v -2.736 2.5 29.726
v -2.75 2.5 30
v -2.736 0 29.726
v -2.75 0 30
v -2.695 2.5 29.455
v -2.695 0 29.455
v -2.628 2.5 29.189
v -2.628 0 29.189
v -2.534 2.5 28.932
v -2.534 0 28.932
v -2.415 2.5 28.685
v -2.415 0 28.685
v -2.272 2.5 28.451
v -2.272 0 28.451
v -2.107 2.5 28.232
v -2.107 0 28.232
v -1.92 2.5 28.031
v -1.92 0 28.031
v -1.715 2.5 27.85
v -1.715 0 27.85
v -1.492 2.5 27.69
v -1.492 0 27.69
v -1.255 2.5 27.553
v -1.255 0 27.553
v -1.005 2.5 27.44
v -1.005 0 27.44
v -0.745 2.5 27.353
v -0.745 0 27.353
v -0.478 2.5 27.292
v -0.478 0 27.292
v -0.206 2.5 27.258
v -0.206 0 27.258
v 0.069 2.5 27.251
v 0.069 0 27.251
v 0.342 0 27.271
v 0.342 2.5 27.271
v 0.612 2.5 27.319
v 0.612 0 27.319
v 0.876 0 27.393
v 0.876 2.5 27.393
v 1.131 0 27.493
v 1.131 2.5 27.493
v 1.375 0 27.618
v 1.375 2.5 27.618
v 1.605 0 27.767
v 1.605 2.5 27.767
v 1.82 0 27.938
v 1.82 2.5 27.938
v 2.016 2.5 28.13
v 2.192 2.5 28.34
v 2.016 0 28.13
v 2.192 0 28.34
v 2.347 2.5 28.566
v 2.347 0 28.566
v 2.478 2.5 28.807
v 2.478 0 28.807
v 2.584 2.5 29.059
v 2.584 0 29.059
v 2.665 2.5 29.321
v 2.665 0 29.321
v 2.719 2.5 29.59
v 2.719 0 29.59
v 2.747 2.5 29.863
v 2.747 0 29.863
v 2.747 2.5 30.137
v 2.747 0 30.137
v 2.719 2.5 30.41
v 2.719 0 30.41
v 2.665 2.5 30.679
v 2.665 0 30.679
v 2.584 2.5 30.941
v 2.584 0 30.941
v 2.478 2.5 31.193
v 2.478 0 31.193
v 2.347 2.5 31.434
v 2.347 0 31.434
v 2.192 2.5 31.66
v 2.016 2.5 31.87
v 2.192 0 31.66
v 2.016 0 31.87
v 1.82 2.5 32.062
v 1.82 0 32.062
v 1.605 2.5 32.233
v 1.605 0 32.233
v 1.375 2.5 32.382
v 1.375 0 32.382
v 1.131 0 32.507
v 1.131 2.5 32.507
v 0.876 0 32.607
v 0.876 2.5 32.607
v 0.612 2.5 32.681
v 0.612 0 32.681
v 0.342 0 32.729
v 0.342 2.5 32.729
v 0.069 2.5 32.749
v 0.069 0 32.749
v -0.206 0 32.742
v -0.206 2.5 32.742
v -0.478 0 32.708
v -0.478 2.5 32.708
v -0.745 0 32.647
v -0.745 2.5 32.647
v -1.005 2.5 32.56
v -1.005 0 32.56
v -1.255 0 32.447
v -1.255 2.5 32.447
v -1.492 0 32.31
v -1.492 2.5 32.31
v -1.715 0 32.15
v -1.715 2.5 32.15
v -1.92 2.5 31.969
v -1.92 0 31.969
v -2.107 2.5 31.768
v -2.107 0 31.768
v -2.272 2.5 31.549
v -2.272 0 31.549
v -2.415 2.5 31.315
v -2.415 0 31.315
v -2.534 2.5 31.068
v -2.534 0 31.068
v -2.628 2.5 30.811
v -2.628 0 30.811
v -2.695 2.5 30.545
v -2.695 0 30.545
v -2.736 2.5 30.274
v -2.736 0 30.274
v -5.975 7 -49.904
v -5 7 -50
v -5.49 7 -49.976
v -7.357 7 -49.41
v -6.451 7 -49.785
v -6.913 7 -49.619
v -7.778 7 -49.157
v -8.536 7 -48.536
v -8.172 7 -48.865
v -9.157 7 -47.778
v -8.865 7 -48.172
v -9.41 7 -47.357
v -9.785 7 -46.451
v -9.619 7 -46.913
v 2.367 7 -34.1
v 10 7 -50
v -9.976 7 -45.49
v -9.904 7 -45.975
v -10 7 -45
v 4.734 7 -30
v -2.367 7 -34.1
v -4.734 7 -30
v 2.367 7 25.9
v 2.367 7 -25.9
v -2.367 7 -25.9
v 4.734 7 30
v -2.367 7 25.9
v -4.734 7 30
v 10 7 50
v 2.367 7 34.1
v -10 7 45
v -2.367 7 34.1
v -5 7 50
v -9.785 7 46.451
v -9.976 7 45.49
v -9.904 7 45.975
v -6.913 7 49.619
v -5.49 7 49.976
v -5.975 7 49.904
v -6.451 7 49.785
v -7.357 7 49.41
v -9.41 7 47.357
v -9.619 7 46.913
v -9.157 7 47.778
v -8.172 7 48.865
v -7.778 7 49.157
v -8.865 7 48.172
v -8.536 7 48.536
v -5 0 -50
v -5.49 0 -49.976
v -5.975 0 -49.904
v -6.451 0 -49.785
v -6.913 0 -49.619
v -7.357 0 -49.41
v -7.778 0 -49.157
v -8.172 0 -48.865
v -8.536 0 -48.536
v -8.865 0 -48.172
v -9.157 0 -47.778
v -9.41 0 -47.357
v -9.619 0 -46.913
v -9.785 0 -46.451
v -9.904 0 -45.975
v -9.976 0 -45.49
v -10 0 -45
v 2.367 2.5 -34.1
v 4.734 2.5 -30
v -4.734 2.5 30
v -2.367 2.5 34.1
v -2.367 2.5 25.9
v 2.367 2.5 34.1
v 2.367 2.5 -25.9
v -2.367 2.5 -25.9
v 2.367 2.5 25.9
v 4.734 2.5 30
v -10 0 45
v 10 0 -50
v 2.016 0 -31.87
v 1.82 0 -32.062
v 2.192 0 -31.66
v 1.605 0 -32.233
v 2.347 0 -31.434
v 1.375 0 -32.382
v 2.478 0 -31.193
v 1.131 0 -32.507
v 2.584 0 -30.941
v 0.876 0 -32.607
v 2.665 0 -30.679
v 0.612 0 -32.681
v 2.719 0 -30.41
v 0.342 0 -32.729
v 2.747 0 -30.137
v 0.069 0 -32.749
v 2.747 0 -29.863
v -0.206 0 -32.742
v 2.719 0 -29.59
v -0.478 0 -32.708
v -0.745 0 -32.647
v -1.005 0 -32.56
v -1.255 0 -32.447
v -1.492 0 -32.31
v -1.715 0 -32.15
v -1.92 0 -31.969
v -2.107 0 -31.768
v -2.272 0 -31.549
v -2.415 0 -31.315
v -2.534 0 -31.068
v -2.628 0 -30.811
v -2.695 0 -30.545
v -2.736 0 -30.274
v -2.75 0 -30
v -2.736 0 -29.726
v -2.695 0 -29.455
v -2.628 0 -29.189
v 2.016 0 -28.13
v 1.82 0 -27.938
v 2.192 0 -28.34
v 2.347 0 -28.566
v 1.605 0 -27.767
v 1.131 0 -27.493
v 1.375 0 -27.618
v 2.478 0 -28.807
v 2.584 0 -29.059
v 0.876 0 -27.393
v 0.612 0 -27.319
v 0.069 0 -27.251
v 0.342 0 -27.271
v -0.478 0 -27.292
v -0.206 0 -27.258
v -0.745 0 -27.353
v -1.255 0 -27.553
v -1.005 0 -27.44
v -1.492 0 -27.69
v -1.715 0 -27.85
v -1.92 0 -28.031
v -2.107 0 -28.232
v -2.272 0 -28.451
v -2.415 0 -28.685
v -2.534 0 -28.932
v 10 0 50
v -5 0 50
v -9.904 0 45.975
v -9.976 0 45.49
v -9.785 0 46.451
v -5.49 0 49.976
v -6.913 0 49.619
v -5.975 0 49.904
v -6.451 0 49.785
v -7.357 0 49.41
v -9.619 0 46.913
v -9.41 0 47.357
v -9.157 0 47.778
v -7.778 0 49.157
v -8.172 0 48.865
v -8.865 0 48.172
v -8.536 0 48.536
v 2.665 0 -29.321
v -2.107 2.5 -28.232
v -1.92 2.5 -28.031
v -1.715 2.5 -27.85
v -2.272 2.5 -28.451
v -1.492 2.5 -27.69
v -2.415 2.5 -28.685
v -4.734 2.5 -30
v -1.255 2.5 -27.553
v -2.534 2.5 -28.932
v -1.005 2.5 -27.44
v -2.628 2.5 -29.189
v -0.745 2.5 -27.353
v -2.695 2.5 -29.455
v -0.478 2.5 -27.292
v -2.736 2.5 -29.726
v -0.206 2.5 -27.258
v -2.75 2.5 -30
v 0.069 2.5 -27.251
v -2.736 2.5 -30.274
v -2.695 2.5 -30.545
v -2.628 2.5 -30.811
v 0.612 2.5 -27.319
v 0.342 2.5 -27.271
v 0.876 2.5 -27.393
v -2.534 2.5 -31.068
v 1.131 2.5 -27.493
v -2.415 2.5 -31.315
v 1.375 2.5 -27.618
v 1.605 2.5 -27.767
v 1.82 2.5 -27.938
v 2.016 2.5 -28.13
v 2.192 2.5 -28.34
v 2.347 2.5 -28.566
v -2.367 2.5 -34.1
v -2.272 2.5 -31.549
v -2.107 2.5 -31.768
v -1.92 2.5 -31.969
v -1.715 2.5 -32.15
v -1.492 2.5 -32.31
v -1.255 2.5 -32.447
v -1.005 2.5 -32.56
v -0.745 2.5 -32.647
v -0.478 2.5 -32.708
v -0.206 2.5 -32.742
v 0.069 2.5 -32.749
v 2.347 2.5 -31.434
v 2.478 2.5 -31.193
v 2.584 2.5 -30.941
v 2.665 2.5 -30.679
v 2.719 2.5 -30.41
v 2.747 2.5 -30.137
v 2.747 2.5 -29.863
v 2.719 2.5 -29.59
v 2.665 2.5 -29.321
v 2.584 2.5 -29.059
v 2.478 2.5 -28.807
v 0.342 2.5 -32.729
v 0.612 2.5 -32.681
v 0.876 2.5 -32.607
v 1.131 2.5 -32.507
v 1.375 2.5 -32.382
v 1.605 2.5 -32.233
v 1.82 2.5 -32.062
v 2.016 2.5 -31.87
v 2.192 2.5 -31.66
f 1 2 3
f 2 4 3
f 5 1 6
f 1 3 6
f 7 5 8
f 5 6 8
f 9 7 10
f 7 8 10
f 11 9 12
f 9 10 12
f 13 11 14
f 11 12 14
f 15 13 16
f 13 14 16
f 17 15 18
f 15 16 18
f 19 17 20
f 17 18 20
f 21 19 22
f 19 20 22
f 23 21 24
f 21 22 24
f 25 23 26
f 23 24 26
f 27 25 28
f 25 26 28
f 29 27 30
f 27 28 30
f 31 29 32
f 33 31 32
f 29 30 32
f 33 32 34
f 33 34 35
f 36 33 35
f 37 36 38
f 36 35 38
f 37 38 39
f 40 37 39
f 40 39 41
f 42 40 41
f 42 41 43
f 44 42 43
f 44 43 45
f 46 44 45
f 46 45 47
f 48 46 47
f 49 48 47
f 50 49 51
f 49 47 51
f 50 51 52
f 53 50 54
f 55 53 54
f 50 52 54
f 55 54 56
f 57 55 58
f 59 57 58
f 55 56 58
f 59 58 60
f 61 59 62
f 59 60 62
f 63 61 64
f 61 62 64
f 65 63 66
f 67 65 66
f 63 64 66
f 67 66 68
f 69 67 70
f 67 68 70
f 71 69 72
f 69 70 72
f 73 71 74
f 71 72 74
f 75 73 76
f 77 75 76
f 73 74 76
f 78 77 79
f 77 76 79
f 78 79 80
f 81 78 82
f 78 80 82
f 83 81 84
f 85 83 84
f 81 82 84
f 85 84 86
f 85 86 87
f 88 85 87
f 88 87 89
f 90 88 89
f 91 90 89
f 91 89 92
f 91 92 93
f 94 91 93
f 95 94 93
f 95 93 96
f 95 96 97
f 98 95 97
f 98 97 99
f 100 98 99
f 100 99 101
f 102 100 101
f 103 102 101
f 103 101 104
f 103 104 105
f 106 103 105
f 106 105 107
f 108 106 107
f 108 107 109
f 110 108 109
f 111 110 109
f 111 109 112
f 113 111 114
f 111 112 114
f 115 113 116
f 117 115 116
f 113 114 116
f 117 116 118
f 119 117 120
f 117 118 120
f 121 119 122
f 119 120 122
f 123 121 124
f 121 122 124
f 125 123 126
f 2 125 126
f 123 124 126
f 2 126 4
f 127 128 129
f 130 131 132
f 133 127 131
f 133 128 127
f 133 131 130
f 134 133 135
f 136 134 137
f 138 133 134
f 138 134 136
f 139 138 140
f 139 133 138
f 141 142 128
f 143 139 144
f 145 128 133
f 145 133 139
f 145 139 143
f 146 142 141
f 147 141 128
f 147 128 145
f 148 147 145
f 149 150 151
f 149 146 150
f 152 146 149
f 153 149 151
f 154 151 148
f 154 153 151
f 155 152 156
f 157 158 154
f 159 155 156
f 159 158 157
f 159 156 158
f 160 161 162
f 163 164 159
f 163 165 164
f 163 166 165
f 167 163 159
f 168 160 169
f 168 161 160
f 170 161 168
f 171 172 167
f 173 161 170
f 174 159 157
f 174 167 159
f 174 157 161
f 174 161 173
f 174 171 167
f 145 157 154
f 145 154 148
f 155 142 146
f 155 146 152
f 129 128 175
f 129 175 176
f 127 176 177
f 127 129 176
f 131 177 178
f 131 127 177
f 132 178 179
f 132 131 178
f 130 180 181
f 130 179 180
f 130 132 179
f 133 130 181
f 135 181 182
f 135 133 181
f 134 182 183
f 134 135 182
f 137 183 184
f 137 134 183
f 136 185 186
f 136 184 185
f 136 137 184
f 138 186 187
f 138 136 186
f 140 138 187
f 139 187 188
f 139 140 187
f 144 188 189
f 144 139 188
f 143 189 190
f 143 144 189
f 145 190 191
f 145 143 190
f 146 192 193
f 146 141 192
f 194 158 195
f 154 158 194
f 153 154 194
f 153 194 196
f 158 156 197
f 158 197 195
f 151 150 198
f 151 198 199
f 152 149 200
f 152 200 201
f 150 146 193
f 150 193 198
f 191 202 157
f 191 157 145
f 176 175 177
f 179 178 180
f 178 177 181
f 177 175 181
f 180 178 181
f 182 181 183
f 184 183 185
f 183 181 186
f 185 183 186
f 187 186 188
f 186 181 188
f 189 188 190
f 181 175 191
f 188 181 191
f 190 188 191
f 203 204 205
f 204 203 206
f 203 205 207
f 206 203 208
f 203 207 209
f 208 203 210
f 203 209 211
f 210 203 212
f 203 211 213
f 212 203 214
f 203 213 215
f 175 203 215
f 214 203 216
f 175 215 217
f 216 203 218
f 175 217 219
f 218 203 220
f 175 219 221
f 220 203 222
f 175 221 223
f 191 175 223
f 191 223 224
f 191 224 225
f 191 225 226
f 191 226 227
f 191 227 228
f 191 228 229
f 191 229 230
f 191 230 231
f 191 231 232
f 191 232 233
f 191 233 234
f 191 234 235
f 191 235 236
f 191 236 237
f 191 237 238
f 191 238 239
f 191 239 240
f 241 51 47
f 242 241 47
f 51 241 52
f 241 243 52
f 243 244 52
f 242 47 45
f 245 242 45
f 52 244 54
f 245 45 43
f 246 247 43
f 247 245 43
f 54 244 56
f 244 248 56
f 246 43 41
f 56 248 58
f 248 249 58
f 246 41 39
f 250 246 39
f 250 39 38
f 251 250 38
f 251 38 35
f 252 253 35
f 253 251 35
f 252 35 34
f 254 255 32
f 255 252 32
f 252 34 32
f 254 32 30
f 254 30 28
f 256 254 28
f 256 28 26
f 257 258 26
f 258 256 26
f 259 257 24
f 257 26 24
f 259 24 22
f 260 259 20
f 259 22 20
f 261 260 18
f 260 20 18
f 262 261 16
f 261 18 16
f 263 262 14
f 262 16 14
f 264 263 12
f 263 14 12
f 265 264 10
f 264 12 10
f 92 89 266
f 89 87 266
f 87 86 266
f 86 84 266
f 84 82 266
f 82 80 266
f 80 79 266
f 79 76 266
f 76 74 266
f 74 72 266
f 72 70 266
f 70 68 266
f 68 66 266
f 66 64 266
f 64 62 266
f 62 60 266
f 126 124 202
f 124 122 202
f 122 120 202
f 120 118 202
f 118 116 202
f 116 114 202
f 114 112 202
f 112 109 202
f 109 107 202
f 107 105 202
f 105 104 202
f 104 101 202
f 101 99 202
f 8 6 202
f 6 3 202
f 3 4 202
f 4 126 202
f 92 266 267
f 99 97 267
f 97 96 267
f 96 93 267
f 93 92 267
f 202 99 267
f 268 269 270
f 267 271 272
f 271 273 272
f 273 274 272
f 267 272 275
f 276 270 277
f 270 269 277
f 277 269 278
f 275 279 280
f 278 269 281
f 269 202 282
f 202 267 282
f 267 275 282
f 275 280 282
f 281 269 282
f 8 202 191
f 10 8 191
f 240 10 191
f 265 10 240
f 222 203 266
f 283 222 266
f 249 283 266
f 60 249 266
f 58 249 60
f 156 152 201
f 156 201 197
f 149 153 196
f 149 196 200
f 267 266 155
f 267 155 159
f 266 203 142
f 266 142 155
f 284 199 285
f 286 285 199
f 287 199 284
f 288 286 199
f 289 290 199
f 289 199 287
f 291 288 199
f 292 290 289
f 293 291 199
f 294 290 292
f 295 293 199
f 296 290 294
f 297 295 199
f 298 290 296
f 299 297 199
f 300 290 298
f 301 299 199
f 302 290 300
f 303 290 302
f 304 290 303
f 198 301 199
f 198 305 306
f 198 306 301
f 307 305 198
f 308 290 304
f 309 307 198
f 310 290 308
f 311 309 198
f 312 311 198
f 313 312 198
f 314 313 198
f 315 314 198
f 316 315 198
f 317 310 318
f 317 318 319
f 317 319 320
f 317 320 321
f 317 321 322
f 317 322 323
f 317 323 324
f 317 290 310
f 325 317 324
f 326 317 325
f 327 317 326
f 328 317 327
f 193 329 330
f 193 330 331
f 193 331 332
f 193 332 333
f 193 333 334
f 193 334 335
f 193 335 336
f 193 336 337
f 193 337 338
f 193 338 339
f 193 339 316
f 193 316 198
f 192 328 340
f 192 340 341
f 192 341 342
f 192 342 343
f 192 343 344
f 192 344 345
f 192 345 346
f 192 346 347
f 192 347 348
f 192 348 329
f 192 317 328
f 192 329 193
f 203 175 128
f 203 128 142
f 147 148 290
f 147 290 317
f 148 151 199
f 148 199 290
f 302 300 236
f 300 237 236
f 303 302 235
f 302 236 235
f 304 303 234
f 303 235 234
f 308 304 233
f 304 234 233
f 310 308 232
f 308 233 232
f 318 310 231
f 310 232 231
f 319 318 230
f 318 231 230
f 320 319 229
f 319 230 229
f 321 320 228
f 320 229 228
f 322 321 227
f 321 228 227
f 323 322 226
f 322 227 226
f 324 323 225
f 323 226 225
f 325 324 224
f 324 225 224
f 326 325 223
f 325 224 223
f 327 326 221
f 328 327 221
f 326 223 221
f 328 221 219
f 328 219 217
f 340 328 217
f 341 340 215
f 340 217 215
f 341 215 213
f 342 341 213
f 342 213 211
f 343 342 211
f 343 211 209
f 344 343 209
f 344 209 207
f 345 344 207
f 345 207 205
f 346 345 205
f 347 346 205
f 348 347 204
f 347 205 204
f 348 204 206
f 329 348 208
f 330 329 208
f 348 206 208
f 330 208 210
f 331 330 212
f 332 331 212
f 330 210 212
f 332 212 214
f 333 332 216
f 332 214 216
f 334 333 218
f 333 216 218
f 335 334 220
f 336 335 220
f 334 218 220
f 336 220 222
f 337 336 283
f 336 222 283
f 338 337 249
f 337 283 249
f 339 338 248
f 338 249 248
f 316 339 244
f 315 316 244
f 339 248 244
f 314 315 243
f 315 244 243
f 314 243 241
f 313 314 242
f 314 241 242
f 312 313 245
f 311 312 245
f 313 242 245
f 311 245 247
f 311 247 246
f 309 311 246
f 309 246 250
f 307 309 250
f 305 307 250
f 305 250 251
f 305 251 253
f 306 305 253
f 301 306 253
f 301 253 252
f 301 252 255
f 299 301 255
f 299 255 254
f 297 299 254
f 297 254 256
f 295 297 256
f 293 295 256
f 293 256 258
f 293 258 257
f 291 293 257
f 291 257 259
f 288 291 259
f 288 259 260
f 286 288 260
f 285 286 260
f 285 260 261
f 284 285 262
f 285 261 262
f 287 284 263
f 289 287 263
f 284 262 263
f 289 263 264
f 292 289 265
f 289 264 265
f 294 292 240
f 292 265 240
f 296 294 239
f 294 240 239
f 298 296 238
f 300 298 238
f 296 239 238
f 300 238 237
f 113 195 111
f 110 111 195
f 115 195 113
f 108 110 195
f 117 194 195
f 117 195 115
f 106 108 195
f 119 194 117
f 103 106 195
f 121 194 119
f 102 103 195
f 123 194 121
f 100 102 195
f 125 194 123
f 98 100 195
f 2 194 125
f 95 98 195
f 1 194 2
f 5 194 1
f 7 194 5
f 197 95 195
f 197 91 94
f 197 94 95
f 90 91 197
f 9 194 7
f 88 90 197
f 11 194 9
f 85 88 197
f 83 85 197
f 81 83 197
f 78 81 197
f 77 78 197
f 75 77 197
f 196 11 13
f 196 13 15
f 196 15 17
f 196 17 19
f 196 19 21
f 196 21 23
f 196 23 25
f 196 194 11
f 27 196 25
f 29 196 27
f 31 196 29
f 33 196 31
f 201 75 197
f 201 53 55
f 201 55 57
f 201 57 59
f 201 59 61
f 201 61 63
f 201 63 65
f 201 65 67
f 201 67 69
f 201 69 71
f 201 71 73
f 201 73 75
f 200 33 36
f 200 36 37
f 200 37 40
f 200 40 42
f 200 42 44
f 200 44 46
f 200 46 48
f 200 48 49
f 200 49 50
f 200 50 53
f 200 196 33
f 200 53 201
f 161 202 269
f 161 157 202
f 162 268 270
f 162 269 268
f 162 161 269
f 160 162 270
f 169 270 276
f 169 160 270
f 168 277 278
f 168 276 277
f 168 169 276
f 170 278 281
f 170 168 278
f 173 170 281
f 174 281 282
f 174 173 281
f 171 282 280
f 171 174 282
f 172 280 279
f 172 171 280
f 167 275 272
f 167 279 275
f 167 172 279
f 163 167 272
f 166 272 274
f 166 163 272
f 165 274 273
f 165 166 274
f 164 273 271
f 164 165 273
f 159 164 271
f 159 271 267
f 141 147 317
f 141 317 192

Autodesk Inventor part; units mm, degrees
ref_plane "YZ Plane" through (0, 0, 0) normal (1, 0, 0) x (0, 1, 0)
ref_plane "XZ Plane" through (0, 0, 0) normal (0, 1, 0) x (-1, 0, 0)
ref_plane "XY Plane" through (0, 0, 0) normal (0, 0, 1) x (1, 0, 0)
sketch "Sketch1" plane through (0, 0, 0) normal (0, 1, 0) x (-1, 0, 0)
  line L0 (-10, 50) -> (10, 50)
  line L1 (10, 50) -> (10, -50)
  line L2 (10, -50) -> (-10, -50)
  line L3 (-10, -50) -> (-10, 50)
  line L4 (-10, 50) -> (10, -50) construction
  line L5 (10, 50) -> (-10, -50) construction
  circle A0 centre (0, 30) radius 2.75
  circle A1 centre (0, -30) radius 2.75
  point P0 (0, 0)
  dimension "d0" = 20
  dimension "d1" = 100
  dimension "d2" = 5.5
  dimension "d3" = 20
  dimension "d4" = 20
extrude "Extrusion1" add sketch "Sketch1" along normal blind 7
sketch "Sketch2" plane through (0, 7, 0) normal (0, 1, 0) x (1, 0, 0)
  circle A0 centre (0, -30) radius 2.75 projected
  circle A1 centre (0, -30) radius 4.1
  circle A2 centre (0, 30) radius 2.75 projected
  circle A3 centre (0, 30) radius 4.1
  line L0 (-4.7343, -30) -> (-2.3671, -25.9)
  line L1 (-2.3671, -25.9) -> (2.3671, -25.9)
  line L2 (2.3671, -25.9) -> (4.7343, -30)
  line L3 (4.7343, -30) -> (2.3671, -34.1)
  line L4 (2.3671, -34.1) -> (-2.3671, -34.1)
  line L5 (-2.3671, -34.1) -> (-4.7343, -30)
  line L6 (-4.7343, 30) -> (-2.3671, 34.1)
  line L7 (-2.3671, 34.1) -> (2.3671, 34.1)
  line L8 (2.3671, 34.1) -> (4.7343, 30)
  line L9 (4.7343, 30) -> (2.3671, 25.9)
  line L10 (2.3671, 25.9) -> (-2.3671, 25.9)
  line L11 (-2.3671, 25.9) -> (-4.7343, 30)
  point P0 (0, 0)
  dimension "d7" = 8.2
extrude "Extrusion2" cut sketch "Sketch2" against normal blind 4.5 contours A0 | A1 | A1 L2 L3 | A1 L1 L2 | L3 L4 A1 | A1 L0 L1 | L4 L5 A1 | A1 L5 L0 | A2 | A3 | A3 L8 L9 | A3 L7 L8 | L9 L10 A3 | A3 L6 L7 | L10 L11 A3 | A3 L11 L6
fillet "Fillet1" radius 5 2 edges at (-10, 3.5, 50) (-10, 3.5, -50)
properties part number "Rubberplate2"
